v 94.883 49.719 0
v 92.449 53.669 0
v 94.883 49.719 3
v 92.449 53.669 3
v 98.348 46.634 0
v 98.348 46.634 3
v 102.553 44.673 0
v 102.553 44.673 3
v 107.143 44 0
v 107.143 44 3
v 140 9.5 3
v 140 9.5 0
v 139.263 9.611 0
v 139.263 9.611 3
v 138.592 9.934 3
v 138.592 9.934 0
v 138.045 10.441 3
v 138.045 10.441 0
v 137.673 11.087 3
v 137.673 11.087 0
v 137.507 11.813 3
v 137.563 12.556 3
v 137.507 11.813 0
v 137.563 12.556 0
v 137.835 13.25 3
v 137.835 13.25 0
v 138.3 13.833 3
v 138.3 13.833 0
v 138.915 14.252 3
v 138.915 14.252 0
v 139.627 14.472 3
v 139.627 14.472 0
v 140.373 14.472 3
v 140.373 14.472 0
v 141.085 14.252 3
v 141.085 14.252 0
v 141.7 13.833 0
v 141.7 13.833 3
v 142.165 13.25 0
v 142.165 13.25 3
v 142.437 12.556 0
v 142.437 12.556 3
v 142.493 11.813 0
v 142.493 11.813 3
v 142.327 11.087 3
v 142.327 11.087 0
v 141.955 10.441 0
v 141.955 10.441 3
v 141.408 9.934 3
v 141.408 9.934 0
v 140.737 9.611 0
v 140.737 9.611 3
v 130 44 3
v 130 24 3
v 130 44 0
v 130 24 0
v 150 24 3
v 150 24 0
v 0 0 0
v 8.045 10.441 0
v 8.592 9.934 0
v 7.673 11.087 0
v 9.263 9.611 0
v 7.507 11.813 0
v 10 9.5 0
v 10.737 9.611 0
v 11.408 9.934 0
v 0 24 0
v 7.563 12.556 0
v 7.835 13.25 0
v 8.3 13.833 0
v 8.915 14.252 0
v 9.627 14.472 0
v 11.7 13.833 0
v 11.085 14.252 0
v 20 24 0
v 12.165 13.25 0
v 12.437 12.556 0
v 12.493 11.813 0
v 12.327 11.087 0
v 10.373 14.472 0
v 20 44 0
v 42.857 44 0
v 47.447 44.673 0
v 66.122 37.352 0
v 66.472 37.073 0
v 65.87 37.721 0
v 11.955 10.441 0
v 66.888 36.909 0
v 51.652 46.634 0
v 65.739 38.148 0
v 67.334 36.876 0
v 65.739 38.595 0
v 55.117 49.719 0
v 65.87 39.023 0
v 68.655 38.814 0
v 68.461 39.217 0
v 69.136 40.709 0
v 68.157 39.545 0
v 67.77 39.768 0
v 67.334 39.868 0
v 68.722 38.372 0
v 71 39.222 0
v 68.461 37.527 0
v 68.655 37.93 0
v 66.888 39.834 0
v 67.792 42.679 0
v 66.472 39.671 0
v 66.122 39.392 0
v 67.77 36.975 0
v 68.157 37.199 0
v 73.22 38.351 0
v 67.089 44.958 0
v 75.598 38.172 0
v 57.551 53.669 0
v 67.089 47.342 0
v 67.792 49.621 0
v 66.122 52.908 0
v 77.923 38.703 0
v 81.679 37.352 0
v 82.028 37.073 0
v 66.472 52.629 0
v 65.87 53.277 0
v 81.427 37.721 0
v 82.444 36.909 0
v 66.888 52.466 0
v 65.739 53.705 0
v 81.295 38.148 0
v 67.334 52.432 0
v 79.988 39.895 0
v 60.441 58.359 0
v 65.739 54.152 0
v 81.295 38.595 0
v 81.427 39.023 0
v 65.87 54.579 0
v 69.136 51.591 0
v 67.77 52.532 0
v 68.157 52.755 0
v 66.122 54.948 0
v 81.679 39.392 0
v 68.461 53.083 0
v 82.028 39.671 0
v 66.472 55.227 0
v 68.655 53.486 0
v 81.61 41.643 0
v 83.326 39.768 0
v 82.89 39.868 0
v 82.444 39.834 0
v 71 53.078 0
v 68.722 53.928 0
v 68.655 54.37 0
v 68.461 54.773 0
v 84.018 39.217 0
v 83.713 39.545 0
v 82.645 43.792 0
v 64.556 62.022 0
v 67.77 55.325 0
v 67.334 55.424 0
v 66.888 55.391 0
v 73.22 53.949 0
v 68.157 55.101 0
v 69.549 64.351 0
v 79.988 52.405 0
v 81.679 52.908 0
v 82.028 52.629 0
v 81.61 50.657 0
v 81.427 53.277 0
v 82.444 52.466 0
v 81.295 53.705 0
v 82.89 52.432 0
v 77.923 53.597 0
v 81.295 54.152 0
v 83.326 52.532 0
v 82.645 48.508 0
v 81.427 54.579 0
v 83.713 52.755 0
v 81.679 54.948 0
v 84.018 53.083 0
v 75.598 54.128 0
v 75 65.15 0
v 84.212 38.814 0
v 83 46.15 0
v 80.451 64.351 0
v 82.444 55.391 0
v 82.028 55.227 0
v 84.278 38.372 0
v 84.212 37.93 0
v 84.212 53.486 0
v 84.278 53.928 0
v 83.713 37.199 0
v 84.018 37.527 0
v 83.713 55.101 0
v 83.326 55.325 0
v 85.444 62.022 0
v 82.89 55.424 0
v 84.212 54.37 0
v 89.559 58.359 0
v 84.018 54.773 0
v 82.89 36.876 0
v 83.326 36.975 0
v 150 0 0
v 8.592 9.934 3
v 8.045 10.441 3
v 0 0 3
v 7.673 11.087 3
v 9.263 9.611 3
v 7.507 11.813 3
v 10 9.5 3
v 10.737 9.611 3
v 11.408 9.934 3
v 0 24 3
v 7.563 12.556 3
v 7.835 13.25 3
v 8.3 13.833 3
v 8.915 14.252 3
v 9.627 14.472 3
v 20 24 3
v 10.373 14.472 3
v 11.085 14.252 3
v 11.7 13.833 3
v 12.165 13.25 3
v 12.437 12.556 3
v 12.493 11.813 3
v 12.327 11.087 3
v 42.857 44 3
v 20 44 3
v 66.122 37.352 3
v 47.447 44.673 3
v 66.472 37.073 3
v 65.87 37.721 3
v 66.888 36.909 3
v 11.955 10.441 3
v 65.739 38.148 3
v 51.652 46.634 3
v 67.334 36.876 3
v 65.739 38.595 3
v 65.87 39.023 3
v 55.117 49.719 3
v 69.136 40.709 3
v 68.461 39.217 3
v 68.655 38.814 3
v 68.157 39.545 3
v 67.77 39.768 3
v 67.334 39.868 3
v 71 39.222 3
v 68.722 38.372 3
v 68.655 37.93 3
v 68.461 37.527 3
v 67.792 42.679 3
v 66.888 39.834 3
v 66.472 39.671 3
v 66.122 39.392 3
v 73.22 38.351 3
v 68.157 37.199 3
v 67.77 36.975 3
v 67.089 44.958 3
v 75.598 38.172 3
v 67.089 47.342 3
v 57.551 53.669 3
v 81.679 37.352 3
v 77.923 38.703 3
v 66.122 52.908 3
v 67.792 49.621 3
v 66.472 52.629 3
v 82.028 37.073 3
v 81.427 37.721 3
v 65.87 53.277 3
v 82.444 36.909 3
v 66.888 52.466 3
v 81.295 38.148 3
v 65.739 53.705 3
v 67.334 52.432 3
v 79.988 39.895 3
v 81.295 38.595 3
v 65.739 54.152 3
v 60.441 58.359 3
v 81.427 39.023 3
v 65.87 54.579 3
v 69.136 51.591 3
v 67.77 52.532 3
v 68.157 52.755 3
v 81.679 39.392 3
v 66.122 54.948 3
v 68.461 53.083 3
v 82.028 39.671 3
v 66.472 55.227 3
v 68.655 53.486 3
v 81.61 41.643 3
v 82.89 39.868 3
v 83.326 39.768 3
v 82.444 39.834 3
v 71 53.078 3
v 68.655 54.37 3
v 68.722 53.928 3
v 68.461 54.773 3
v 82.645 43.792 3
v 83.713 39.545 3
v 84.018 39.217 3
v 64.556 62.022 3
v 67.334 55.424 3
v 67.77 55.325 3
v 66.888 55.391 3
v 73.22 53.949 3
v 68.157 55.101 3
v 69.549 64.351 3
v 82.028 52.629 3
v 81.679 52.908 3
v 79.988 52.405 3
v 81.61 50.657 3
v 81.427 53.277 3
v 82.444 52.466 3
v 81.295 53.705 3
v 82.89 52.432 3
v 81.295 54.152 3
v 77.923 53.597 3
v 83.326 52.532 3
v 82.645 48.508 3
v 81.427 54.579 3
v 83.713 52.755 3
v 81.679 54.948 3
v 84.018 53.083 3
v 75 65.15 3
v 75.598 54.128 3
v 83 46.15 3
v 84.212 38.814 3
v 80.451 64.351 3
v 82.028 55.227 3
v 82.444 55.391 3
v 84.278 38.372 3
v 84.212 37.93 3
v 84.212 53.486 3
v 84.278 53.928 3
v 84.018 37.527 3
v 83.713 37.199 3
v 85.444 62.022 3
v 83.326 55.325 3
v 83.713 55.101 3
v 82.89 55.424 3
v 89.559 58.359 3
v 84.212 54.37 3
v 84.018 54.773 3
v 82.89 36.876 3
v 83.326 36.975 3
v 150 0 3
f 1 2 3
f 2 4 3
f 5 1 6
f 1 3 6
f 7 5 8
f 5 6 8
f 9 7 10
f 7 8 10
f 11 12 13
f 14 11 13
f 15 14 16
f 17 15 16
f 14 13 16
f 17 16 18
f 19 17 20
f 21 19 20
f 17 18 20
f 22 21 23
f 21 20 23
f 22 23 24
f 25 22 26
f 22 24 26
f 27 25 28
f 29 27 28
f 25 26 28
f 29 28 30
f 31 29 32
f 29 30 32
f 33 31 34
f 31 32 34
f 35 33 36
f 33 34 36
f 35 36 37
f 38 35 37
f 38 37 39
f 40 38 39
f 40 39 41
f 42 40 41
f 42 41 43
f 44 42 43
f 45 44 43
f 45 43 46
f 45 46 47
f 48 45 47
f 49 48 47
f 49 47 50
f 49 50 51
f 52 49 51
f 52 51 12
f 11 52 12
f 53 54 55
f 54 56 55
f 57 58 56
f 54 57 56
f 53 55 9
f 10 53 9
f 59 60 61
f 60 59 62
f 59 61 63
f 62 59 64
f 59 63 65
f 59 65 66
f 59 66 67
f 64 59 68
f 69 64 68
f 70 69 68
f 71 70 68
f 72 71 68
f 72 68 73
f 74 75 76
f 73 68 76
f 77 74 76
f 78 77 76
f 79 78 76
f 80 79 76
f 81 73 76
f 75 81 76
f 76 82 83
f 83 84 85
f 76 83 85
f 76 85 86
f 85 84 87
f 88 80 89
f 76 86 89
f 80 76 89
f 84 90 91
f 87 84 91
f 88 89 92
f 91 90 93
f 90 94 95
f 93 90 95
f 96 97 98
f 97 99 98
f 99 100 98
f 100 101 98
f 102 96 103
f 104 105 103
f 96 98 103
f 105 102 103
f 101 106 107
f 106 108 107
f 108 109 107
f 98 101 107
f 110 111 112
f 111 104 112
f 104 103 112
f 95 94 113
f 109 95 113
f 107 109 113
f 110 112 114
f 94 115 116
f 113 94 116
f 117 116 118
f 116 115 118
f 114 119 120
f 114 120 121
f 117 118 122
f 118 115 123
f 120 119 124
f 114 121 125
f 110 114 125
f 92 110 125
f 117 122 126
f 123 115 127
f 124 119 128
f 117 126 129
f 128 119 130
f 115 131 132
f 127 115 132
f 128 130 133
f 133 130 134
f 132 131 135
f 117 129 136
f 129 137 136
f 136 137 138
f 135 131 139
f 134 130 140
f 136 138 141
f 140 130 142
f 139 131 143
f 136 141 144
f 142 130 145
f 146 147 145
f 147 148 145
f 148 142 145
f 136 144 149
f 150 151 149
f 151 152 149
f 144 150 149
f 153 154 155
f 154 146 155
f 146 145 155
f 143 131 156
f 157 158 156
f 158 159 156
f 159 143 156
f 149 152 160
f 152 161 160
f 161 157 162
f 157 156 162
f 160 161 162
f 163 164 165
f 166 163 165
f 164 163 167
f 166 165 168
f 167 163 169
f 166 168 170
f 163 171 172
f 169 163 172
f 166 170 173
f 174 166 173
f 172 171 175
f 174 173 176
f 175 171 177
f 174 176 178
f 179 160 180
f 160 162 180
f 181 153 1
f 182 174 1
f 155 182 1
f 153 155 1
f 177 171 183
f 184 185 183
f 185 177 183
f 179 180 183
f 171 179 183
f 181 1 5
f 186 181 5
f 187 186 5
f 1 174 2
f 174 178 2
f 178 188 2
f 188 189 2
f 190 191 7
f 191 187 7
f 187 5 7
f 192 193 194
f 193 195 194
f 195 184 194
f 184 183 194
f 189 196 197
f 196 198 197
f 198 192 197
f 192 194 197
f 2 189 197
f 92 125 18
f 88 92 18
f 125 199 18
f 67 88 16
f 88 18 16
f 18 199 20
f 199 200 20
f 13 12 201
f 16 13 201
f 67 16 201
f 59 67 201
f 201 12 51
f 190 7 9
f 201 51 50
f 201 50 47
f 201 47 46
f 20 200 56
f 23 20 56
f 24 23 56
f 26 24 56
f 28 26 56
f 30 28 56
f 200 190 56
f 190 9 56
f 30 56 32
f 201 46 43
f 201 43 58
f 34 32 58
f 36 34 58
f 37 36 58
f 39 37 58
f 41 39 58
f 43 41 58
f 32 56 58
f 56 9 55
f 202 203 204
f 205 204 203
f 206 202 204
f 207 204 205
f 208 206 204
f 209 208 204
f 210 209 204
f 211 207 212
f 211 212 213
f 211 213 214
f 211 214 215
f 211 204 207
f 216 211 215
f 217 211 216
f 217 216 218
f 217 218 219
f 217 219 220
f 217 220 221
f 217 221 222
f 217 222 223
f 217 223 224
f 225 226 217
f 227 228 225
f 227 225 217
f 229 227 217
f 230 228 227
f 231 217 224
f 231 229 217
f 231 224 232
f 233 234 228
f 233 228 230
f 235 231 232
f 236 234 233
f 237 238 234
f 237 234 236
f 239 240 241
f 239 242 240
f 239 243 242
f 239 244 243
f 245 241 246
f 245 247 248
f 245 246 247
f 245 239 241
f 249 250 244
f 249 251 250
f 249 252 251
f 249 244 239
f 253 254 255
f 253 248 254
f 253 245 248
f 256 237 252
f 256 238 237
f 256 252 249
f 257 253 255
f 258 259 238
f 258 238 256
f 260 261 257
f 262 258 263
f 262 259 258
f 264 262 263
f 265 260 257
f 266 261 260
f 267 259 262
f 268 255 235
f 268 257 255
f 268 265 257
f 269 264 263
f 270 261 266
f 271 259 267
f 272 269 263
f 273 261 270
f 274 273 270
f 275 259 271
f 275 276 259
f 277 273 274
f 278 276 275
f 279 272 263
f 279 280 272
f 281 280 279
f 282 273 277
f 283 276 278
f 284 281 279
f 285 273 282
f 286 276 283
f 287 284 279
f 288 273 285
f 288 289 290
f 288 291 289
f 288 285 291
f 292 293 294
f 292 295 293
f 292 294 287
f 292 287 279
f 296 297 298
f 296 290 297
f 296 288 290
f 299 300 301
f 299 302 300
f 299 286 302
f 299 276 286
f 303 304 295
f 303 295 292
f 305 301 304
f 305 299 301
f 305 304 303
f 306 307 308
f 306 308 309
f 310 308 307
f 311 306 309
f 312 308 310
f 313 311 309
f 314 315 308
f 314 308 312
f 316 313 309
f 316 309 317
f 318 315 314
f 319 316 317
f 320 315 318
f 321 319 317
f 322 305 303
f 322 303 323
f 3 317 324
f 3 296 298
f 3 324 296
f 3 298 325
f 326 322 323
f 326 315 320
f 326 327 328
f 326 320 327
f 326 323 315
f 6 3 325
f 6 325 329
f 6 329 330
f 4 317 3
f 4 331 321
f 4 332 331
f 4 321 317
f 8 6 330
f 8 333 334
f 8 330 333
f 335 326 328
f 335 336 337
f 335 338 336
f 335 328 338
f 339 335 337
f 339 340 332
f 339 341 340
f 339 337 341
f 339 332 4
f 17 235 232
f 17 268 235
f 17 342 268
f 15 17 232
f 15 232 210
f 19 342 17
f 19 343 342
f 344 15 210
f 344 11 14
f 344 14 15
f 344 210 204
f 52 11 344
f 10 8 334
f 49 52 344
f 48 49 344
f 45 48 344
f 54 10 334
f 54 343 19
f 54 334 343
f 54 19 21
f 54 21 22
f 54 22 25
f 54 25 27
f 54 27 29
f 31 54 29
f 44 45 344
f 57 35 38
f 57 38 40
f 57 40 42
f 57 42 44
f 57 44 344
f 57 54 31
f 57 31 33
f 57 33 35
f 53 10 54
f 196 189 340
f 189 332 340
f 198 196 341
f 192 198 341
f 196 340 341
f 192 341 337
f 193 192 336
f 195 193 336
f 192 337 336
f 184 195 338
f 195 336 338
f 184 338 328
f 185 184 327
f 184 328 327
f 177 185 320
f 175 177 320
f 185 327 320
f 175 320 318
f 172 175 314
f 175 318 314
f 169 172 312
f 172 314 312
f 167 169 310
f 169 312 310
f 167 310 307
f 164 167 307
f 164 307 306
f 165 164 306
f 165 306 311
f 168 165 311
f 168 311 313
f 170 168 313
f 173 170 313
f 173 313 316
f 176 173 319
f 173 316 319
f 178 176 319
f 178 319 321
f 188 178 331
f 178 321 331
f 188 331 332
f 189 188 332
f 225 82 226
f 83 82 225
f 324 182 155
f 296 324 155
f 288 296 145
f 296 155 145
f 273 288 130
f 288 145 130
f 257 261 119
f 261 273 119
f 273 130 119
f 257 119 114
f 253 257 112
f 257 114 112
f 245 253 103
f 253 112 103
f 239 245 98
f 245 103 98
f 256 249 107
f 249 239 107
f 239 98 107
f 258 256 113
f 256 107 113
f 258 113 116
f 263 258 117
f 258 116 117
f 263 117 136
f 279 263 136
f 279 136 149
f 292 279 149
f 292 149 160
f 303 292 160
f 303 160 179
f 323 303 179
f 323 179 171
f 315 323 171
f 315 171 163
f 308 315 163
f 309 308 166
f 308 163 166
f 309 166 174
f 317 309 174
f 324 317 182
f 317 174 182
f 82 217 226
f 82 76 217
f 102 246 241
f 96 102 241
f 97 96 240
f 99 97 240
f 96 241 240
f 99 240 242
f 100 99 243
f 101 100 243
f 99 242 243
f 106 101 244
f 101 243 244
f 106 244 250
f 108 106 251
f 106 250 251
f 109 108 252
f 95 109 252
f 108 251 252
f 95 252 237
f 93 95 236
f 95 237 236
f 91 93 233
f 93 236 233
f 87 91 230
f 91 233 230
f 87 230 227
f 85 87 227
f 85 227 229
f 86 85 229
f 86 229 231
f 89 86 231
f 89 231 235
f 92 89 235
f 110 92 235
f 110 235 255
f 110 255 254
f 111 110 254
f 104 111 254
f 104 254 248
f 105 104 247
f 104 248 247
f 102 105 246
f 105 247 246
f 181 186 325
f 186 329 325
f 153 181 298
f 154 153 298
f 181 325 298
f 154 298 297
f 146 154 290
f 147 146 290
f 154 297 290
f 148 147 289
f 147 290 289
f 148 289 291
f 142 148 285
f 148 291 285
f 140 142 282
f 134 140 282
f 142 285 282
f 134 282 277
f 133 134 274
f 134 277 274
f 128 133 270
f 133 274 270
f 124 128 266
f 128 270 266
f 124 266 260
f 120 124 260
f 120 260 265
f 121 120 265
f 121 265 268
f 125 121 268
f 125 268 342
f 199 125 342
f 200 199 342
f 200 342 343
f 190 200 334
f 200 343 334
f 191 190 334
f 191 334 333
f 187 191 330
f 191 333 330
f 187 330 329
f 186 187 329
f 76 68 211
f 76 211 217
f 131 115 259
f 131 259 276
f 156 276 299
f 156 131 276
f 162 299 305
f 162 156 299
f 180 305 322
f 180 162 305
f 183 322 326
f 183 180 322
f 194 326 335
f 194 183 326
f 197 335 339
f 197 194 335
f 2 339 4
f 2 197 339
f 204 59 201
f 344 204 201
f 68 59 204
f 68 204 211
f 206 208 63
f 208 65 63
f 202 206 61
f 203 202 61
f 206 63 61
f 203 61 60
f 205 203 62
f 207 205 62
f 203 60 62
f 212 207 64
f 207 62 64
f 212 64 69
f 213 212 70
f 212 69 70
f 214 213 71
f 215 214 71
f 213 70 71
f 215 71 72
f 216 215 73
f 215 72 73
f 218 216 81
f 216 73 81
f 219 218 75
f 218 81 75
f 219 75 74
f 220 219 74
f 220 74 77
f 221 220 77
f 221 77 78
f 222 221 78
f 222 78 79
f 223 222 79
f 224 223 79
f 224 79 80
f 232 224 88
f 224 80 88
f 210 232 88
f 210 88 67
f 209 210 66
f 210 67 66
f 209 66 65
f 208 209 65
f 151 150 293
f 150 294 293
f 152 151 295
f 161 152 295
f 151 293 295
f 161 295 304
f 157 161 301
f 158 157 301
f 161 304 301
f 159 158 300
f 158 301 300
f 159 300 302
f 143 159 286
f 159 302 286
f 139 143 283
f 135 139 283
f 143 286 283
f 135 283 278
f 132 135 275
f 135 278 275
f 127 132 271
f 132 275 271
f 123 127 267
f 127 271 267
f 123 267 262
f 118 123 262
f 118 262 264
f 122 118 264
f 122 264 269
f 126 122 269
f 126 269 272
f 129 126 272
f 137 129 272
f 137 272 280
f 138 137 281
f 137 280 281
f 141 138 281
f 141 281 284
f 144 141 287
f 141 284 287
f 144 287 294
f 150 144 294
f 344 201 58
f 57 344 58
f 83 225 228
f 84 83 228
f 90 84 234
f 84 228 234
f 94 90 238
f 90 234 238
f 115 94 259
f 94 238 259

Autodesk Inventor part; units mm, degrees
ref_plane "YZ Plane" through (0, 0, 0) normal (1, 0, 0) x (0, 1, 0)
ref_plane "XZ Plane" through (0, 0, 0) normal (0, 1, 0) x (-1, 0, 0)
ref_plane "XY Plane" through (0, 0, 0) normal (0, 0, 1) x (1, 0, 0)
sketch "Sketch1" plane through (0, 0, 0) normal (0, 0, 1) x (1, 0, 0)
  line L0 (0, 0) -> (150, 0)
  line L1 (0, 0) -> (0, 24)
  line L2 (0, 24) -> (20, 24)
  circle A0 centre (75, 46.15) radius 8
  line L3 (20, 24) -> (20, 44)
  line L4 (20, 44) -> (56.122, 44)
  line L5 (150, 0) -> (150, 24)
  line L6 (150, 24) -> (130, 24)
  line L7 (130, 24) -> (130, 44)
  line L8 (130, 44) -> (93.878, 44)
  arc A1 (93.878, 44) -> (56.122, 44) centre (75, 46.15) ccw
  dimension "d0" = 150
  dimension "d1" = 24
  dimension "d3" = 16
  dimension "d4" = 20
  dimension "d5" = 38
  dimension "d6" = 75
  dimension "d7" = 22.15
  dimension "d19" = 20
  dimension "d20" = 20
extrude "Extrusion1" add sketch "Sketch1" along normal blind 3
fillet "Fillet1" radius 16 2 edges at (56.122, 44, 1.5) (93.878, 44, 1.5)
sketch "Sketch2" plane through (0, 0, 3) normal (0, 0, 1) x (1, 0, 0)
  circle A0 centre (82.7782, 53.9282) radius 1.5
  circle A1 centre (67.2218, 53.9282) radius 1.5
  circle A2 centre (67.2218, 38.3718) radius 1.5
  circle A3 centre (82.7782, 38.3718) radius 1.5
  circle A4 centre (75, 46.15) radius 8 projected
  circle A5 centre (75, 46.15) radius 11 construction
  line L0 (82.7782, 38.3718) -> (67.2218, 38.3718) construction
  line L1 (67.2218, 38.3718) -> (67.2218, 53.9282) construction
  dimension "d22" = 3
  dimension "d26" = 22
extrude "Extrusion2" cut sketch "Sketch2" against normal up to surface (3 mm away) contours A0 | A1 | A2 | A3
sketch "Sketch3" plane through (0, 0, 3) normal (0, 0, 1) x (1, 0, 0)
  line L0 (0, 0) -> (150, 0) projected
  line L1 (150, 0) -> (150, 24) projected
  line L2 (0, 24) -> (0, 0) projected
  point P0 (10, 12)
  point P1 (140, 12)
  dimension "d27" = 10
  dimension "d28" = 10
  dimension "d29" = 12
hole "Hole1" at (10, 12, 3) at (140, 12, 3) direction (0, 0, -1) diameter 5 end through all
properties part number "ZAxisNutMountMetal" material "Steel, Alloy"
